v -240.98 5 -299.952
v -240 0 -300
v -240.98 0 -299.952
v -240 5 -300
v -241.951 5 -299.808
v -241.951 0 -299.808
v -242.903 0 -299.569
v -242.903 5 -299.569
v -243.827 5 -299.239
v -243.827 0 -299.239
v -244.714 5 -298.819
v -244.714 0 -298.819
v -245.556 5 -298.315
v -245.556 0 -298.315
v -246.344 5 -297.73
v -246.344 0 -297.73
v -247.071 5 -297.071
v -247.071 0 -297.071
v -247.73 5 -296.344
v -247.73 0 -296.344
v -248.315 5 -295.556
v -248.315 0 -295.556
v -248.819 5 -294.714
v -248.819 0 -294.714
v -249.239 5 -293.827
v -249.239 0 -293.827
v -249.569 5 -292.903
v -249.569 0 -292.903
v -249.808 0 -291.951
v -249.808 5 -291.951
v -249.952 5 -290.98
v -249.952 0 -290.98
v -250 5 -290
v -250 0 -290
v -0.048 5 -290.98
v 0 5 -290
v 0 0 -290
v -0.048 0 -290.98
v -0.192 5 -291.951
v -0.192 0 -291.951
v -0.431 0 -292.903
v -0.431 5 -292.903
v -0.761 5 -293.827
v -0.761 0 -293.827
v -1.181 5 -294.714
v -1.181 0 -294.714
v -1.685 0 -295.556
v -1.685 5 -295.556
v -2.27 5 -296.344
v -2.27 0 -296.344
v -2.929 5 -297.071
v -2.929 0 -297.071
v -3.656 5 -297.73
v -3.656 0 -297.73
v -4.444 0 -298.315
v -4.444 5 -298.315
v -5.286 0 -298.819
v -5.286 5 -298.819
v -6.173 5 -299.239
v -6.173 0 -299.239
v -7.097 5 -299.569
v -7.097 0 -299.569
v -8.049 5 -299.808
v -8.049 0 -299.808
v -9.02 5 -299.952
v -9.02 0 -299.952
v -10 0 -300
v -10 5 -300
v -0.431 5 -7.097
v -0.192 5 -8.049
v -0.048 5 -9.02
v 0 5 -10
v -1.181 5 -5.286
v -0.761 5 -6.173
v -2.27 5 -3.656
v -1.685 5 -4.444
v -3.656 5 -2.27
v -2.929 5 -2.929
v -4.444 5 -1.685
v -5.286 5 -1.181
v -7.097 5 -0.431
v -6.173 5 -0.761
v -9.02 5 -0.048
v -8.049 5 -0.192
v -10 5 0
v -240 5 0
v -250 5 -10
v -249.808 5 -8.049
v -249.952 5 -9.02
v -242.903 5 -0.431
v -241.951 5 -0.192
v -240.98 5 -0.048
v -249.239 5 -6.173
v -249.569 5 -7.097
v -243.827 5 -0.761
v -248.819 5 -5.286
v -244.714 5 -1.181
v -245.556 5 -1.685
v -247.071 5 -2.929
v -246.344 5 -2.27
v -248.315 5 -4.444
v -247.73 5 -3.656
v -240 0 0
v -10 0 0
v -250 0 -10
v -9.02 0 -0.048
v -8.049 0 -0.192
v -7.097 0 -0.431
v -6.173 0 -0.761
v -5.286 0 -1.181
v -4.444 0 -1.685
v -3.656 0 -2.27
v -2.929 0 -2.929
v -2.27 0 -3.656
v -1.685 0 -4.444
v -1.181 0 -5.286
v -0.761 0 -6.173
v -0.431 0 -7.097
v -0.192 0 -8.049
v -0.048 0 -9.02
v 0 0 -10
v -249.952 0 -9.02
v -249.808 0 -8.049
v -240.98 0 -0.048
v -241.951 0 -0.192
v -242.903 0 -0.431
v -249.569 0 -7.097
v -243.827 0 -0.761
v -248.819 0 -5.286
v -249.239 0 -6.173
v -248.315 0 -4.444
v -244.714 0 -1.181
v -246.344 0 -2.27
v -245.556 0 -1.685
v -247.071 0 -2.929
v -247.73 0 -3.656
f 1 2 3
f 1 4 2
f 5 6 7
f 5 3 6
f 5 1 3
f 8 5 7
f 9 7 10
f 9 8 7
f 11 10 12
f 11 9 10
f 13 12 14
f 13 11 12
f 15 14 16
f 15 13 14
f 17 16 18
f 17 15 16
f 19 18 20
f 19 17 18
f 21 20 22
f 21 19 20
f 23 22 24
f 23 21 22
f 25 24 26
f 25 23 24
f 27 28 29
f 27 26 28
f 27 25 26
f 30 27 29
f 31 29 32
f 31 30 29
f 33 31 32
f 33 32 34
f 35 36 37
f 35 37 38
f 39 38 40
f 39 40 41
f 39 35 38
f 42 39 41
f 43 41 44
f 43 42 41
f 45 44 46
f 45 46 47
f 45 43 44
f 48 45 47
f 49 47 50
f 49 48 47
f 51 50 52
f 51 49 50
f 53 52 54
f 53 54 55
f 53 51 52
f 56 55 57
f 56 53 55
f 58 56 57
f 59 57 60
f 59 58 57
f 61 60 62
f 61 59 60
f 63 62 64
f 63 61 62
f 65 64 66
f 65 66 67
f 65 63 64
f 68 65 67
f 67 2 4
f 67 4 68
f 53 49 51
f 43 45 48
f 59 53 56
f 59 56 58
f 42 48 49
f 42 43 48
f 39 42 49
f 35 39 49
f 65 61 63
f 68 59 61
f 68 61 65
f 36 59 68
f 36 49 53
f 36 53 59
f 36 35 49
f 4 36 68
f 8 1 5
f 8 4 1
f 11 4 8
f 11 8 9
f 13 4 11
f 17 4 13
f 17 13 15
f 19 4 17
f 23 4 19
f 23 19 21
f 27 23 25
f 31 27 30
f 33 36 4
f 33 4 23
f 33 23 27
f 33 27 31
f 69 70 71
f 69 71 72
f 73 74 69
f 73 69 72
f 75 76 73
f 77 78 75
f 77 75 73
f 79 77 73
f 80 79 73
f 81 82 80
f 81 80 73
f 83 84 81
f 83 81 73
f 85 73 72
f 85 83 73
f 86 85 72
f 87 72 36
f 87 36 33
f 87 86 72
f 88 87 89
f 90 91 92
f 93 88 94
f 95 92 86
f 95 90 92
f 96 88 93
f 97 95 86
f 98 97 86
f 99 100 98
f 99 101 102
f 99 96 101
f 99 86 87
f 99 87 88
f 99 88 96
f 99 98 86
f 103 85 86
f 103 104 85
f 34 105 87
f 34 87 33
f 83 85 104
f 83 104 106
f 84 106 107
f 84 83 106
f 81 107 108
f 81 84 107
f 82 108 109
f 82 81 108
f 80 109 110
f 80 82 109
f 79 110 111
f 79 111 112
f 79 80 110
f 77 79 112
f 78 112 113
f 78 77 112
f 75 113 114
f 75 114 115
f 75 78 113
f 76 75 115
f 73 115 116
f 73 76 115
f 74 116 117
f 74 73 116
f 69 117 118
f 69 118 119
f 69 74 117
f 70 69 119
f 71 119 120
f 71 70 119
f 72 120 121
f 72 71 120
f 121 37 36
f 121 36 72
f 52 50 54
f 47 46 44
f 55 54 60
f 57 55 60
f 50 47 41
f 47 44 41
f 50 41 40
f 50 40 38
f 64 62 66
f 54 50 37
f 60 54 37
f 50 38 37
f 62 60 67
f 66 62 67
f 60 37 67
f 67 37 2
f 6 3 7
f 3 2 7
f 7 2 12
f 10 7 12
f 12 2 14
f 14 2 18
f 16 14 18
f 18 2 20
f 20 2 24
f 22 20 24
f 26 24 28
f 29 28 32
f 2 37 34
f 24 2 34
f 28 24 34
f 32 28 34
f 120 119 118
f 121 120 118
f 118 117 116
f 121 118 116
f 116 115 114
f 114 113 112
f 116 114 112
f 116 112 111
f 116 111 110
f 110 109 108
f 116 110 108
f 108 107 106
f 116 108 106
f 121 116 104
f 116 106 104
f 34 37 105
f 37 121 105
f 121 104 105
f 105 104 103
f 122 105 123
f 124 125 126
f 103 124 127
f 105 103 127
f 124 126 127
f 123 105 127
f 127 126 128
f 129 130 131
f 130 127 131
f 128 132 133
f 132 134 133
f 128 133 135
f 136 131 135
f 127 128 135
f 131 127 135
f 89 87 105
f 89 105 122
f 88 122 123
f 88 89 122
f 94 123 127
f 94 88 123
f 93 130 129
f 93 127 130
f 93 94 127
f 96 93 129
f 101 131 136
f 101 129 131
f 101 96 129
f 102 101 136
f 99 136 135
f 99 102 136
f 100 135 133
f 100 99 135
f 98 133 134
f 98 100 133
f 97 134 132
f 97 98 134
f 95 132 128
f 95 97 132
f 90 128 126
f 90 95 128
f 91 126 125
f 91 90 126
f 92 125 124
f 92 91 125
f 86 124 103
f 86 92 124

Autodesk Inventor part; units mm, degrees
ref_plane "YZ Plane" through (0, 0, 0) normal (1, 0, 0) x (0, 1, 0)
ref_plane "XZ Plane" through (0, 0, 0) normal (0, 1, 0) x (-1, 0, 0)
ref_plane "XY Plane" through (0, 0, 0) normal (0, 0, 1) x (1, 0, 0)
sketch "Sketch1" plane through (0, 0, 0) normal (0, 1, 0) x (-1, 0, 0)
  line L0 (0, 0) -> (250, 0)
  line L1 (250, 0) -> (250, -300)
  line L2 (250, -300) -> (0, -300)
  line L3 (0, -300) -> (0, 0)
  dimension "d0" = 250
  dimension "d1" = 300
extrude "Extrusion1" add sketch "Sketch1" along normal blind 5
fillet "Fillet1" radius 10 1 edges at (-250, 2.5, 0)
fillet "Fillet2" radius 10 3 edges at (0, 2.5, 0) (0, 2.5, -300) (-250, 2.5, -300)
